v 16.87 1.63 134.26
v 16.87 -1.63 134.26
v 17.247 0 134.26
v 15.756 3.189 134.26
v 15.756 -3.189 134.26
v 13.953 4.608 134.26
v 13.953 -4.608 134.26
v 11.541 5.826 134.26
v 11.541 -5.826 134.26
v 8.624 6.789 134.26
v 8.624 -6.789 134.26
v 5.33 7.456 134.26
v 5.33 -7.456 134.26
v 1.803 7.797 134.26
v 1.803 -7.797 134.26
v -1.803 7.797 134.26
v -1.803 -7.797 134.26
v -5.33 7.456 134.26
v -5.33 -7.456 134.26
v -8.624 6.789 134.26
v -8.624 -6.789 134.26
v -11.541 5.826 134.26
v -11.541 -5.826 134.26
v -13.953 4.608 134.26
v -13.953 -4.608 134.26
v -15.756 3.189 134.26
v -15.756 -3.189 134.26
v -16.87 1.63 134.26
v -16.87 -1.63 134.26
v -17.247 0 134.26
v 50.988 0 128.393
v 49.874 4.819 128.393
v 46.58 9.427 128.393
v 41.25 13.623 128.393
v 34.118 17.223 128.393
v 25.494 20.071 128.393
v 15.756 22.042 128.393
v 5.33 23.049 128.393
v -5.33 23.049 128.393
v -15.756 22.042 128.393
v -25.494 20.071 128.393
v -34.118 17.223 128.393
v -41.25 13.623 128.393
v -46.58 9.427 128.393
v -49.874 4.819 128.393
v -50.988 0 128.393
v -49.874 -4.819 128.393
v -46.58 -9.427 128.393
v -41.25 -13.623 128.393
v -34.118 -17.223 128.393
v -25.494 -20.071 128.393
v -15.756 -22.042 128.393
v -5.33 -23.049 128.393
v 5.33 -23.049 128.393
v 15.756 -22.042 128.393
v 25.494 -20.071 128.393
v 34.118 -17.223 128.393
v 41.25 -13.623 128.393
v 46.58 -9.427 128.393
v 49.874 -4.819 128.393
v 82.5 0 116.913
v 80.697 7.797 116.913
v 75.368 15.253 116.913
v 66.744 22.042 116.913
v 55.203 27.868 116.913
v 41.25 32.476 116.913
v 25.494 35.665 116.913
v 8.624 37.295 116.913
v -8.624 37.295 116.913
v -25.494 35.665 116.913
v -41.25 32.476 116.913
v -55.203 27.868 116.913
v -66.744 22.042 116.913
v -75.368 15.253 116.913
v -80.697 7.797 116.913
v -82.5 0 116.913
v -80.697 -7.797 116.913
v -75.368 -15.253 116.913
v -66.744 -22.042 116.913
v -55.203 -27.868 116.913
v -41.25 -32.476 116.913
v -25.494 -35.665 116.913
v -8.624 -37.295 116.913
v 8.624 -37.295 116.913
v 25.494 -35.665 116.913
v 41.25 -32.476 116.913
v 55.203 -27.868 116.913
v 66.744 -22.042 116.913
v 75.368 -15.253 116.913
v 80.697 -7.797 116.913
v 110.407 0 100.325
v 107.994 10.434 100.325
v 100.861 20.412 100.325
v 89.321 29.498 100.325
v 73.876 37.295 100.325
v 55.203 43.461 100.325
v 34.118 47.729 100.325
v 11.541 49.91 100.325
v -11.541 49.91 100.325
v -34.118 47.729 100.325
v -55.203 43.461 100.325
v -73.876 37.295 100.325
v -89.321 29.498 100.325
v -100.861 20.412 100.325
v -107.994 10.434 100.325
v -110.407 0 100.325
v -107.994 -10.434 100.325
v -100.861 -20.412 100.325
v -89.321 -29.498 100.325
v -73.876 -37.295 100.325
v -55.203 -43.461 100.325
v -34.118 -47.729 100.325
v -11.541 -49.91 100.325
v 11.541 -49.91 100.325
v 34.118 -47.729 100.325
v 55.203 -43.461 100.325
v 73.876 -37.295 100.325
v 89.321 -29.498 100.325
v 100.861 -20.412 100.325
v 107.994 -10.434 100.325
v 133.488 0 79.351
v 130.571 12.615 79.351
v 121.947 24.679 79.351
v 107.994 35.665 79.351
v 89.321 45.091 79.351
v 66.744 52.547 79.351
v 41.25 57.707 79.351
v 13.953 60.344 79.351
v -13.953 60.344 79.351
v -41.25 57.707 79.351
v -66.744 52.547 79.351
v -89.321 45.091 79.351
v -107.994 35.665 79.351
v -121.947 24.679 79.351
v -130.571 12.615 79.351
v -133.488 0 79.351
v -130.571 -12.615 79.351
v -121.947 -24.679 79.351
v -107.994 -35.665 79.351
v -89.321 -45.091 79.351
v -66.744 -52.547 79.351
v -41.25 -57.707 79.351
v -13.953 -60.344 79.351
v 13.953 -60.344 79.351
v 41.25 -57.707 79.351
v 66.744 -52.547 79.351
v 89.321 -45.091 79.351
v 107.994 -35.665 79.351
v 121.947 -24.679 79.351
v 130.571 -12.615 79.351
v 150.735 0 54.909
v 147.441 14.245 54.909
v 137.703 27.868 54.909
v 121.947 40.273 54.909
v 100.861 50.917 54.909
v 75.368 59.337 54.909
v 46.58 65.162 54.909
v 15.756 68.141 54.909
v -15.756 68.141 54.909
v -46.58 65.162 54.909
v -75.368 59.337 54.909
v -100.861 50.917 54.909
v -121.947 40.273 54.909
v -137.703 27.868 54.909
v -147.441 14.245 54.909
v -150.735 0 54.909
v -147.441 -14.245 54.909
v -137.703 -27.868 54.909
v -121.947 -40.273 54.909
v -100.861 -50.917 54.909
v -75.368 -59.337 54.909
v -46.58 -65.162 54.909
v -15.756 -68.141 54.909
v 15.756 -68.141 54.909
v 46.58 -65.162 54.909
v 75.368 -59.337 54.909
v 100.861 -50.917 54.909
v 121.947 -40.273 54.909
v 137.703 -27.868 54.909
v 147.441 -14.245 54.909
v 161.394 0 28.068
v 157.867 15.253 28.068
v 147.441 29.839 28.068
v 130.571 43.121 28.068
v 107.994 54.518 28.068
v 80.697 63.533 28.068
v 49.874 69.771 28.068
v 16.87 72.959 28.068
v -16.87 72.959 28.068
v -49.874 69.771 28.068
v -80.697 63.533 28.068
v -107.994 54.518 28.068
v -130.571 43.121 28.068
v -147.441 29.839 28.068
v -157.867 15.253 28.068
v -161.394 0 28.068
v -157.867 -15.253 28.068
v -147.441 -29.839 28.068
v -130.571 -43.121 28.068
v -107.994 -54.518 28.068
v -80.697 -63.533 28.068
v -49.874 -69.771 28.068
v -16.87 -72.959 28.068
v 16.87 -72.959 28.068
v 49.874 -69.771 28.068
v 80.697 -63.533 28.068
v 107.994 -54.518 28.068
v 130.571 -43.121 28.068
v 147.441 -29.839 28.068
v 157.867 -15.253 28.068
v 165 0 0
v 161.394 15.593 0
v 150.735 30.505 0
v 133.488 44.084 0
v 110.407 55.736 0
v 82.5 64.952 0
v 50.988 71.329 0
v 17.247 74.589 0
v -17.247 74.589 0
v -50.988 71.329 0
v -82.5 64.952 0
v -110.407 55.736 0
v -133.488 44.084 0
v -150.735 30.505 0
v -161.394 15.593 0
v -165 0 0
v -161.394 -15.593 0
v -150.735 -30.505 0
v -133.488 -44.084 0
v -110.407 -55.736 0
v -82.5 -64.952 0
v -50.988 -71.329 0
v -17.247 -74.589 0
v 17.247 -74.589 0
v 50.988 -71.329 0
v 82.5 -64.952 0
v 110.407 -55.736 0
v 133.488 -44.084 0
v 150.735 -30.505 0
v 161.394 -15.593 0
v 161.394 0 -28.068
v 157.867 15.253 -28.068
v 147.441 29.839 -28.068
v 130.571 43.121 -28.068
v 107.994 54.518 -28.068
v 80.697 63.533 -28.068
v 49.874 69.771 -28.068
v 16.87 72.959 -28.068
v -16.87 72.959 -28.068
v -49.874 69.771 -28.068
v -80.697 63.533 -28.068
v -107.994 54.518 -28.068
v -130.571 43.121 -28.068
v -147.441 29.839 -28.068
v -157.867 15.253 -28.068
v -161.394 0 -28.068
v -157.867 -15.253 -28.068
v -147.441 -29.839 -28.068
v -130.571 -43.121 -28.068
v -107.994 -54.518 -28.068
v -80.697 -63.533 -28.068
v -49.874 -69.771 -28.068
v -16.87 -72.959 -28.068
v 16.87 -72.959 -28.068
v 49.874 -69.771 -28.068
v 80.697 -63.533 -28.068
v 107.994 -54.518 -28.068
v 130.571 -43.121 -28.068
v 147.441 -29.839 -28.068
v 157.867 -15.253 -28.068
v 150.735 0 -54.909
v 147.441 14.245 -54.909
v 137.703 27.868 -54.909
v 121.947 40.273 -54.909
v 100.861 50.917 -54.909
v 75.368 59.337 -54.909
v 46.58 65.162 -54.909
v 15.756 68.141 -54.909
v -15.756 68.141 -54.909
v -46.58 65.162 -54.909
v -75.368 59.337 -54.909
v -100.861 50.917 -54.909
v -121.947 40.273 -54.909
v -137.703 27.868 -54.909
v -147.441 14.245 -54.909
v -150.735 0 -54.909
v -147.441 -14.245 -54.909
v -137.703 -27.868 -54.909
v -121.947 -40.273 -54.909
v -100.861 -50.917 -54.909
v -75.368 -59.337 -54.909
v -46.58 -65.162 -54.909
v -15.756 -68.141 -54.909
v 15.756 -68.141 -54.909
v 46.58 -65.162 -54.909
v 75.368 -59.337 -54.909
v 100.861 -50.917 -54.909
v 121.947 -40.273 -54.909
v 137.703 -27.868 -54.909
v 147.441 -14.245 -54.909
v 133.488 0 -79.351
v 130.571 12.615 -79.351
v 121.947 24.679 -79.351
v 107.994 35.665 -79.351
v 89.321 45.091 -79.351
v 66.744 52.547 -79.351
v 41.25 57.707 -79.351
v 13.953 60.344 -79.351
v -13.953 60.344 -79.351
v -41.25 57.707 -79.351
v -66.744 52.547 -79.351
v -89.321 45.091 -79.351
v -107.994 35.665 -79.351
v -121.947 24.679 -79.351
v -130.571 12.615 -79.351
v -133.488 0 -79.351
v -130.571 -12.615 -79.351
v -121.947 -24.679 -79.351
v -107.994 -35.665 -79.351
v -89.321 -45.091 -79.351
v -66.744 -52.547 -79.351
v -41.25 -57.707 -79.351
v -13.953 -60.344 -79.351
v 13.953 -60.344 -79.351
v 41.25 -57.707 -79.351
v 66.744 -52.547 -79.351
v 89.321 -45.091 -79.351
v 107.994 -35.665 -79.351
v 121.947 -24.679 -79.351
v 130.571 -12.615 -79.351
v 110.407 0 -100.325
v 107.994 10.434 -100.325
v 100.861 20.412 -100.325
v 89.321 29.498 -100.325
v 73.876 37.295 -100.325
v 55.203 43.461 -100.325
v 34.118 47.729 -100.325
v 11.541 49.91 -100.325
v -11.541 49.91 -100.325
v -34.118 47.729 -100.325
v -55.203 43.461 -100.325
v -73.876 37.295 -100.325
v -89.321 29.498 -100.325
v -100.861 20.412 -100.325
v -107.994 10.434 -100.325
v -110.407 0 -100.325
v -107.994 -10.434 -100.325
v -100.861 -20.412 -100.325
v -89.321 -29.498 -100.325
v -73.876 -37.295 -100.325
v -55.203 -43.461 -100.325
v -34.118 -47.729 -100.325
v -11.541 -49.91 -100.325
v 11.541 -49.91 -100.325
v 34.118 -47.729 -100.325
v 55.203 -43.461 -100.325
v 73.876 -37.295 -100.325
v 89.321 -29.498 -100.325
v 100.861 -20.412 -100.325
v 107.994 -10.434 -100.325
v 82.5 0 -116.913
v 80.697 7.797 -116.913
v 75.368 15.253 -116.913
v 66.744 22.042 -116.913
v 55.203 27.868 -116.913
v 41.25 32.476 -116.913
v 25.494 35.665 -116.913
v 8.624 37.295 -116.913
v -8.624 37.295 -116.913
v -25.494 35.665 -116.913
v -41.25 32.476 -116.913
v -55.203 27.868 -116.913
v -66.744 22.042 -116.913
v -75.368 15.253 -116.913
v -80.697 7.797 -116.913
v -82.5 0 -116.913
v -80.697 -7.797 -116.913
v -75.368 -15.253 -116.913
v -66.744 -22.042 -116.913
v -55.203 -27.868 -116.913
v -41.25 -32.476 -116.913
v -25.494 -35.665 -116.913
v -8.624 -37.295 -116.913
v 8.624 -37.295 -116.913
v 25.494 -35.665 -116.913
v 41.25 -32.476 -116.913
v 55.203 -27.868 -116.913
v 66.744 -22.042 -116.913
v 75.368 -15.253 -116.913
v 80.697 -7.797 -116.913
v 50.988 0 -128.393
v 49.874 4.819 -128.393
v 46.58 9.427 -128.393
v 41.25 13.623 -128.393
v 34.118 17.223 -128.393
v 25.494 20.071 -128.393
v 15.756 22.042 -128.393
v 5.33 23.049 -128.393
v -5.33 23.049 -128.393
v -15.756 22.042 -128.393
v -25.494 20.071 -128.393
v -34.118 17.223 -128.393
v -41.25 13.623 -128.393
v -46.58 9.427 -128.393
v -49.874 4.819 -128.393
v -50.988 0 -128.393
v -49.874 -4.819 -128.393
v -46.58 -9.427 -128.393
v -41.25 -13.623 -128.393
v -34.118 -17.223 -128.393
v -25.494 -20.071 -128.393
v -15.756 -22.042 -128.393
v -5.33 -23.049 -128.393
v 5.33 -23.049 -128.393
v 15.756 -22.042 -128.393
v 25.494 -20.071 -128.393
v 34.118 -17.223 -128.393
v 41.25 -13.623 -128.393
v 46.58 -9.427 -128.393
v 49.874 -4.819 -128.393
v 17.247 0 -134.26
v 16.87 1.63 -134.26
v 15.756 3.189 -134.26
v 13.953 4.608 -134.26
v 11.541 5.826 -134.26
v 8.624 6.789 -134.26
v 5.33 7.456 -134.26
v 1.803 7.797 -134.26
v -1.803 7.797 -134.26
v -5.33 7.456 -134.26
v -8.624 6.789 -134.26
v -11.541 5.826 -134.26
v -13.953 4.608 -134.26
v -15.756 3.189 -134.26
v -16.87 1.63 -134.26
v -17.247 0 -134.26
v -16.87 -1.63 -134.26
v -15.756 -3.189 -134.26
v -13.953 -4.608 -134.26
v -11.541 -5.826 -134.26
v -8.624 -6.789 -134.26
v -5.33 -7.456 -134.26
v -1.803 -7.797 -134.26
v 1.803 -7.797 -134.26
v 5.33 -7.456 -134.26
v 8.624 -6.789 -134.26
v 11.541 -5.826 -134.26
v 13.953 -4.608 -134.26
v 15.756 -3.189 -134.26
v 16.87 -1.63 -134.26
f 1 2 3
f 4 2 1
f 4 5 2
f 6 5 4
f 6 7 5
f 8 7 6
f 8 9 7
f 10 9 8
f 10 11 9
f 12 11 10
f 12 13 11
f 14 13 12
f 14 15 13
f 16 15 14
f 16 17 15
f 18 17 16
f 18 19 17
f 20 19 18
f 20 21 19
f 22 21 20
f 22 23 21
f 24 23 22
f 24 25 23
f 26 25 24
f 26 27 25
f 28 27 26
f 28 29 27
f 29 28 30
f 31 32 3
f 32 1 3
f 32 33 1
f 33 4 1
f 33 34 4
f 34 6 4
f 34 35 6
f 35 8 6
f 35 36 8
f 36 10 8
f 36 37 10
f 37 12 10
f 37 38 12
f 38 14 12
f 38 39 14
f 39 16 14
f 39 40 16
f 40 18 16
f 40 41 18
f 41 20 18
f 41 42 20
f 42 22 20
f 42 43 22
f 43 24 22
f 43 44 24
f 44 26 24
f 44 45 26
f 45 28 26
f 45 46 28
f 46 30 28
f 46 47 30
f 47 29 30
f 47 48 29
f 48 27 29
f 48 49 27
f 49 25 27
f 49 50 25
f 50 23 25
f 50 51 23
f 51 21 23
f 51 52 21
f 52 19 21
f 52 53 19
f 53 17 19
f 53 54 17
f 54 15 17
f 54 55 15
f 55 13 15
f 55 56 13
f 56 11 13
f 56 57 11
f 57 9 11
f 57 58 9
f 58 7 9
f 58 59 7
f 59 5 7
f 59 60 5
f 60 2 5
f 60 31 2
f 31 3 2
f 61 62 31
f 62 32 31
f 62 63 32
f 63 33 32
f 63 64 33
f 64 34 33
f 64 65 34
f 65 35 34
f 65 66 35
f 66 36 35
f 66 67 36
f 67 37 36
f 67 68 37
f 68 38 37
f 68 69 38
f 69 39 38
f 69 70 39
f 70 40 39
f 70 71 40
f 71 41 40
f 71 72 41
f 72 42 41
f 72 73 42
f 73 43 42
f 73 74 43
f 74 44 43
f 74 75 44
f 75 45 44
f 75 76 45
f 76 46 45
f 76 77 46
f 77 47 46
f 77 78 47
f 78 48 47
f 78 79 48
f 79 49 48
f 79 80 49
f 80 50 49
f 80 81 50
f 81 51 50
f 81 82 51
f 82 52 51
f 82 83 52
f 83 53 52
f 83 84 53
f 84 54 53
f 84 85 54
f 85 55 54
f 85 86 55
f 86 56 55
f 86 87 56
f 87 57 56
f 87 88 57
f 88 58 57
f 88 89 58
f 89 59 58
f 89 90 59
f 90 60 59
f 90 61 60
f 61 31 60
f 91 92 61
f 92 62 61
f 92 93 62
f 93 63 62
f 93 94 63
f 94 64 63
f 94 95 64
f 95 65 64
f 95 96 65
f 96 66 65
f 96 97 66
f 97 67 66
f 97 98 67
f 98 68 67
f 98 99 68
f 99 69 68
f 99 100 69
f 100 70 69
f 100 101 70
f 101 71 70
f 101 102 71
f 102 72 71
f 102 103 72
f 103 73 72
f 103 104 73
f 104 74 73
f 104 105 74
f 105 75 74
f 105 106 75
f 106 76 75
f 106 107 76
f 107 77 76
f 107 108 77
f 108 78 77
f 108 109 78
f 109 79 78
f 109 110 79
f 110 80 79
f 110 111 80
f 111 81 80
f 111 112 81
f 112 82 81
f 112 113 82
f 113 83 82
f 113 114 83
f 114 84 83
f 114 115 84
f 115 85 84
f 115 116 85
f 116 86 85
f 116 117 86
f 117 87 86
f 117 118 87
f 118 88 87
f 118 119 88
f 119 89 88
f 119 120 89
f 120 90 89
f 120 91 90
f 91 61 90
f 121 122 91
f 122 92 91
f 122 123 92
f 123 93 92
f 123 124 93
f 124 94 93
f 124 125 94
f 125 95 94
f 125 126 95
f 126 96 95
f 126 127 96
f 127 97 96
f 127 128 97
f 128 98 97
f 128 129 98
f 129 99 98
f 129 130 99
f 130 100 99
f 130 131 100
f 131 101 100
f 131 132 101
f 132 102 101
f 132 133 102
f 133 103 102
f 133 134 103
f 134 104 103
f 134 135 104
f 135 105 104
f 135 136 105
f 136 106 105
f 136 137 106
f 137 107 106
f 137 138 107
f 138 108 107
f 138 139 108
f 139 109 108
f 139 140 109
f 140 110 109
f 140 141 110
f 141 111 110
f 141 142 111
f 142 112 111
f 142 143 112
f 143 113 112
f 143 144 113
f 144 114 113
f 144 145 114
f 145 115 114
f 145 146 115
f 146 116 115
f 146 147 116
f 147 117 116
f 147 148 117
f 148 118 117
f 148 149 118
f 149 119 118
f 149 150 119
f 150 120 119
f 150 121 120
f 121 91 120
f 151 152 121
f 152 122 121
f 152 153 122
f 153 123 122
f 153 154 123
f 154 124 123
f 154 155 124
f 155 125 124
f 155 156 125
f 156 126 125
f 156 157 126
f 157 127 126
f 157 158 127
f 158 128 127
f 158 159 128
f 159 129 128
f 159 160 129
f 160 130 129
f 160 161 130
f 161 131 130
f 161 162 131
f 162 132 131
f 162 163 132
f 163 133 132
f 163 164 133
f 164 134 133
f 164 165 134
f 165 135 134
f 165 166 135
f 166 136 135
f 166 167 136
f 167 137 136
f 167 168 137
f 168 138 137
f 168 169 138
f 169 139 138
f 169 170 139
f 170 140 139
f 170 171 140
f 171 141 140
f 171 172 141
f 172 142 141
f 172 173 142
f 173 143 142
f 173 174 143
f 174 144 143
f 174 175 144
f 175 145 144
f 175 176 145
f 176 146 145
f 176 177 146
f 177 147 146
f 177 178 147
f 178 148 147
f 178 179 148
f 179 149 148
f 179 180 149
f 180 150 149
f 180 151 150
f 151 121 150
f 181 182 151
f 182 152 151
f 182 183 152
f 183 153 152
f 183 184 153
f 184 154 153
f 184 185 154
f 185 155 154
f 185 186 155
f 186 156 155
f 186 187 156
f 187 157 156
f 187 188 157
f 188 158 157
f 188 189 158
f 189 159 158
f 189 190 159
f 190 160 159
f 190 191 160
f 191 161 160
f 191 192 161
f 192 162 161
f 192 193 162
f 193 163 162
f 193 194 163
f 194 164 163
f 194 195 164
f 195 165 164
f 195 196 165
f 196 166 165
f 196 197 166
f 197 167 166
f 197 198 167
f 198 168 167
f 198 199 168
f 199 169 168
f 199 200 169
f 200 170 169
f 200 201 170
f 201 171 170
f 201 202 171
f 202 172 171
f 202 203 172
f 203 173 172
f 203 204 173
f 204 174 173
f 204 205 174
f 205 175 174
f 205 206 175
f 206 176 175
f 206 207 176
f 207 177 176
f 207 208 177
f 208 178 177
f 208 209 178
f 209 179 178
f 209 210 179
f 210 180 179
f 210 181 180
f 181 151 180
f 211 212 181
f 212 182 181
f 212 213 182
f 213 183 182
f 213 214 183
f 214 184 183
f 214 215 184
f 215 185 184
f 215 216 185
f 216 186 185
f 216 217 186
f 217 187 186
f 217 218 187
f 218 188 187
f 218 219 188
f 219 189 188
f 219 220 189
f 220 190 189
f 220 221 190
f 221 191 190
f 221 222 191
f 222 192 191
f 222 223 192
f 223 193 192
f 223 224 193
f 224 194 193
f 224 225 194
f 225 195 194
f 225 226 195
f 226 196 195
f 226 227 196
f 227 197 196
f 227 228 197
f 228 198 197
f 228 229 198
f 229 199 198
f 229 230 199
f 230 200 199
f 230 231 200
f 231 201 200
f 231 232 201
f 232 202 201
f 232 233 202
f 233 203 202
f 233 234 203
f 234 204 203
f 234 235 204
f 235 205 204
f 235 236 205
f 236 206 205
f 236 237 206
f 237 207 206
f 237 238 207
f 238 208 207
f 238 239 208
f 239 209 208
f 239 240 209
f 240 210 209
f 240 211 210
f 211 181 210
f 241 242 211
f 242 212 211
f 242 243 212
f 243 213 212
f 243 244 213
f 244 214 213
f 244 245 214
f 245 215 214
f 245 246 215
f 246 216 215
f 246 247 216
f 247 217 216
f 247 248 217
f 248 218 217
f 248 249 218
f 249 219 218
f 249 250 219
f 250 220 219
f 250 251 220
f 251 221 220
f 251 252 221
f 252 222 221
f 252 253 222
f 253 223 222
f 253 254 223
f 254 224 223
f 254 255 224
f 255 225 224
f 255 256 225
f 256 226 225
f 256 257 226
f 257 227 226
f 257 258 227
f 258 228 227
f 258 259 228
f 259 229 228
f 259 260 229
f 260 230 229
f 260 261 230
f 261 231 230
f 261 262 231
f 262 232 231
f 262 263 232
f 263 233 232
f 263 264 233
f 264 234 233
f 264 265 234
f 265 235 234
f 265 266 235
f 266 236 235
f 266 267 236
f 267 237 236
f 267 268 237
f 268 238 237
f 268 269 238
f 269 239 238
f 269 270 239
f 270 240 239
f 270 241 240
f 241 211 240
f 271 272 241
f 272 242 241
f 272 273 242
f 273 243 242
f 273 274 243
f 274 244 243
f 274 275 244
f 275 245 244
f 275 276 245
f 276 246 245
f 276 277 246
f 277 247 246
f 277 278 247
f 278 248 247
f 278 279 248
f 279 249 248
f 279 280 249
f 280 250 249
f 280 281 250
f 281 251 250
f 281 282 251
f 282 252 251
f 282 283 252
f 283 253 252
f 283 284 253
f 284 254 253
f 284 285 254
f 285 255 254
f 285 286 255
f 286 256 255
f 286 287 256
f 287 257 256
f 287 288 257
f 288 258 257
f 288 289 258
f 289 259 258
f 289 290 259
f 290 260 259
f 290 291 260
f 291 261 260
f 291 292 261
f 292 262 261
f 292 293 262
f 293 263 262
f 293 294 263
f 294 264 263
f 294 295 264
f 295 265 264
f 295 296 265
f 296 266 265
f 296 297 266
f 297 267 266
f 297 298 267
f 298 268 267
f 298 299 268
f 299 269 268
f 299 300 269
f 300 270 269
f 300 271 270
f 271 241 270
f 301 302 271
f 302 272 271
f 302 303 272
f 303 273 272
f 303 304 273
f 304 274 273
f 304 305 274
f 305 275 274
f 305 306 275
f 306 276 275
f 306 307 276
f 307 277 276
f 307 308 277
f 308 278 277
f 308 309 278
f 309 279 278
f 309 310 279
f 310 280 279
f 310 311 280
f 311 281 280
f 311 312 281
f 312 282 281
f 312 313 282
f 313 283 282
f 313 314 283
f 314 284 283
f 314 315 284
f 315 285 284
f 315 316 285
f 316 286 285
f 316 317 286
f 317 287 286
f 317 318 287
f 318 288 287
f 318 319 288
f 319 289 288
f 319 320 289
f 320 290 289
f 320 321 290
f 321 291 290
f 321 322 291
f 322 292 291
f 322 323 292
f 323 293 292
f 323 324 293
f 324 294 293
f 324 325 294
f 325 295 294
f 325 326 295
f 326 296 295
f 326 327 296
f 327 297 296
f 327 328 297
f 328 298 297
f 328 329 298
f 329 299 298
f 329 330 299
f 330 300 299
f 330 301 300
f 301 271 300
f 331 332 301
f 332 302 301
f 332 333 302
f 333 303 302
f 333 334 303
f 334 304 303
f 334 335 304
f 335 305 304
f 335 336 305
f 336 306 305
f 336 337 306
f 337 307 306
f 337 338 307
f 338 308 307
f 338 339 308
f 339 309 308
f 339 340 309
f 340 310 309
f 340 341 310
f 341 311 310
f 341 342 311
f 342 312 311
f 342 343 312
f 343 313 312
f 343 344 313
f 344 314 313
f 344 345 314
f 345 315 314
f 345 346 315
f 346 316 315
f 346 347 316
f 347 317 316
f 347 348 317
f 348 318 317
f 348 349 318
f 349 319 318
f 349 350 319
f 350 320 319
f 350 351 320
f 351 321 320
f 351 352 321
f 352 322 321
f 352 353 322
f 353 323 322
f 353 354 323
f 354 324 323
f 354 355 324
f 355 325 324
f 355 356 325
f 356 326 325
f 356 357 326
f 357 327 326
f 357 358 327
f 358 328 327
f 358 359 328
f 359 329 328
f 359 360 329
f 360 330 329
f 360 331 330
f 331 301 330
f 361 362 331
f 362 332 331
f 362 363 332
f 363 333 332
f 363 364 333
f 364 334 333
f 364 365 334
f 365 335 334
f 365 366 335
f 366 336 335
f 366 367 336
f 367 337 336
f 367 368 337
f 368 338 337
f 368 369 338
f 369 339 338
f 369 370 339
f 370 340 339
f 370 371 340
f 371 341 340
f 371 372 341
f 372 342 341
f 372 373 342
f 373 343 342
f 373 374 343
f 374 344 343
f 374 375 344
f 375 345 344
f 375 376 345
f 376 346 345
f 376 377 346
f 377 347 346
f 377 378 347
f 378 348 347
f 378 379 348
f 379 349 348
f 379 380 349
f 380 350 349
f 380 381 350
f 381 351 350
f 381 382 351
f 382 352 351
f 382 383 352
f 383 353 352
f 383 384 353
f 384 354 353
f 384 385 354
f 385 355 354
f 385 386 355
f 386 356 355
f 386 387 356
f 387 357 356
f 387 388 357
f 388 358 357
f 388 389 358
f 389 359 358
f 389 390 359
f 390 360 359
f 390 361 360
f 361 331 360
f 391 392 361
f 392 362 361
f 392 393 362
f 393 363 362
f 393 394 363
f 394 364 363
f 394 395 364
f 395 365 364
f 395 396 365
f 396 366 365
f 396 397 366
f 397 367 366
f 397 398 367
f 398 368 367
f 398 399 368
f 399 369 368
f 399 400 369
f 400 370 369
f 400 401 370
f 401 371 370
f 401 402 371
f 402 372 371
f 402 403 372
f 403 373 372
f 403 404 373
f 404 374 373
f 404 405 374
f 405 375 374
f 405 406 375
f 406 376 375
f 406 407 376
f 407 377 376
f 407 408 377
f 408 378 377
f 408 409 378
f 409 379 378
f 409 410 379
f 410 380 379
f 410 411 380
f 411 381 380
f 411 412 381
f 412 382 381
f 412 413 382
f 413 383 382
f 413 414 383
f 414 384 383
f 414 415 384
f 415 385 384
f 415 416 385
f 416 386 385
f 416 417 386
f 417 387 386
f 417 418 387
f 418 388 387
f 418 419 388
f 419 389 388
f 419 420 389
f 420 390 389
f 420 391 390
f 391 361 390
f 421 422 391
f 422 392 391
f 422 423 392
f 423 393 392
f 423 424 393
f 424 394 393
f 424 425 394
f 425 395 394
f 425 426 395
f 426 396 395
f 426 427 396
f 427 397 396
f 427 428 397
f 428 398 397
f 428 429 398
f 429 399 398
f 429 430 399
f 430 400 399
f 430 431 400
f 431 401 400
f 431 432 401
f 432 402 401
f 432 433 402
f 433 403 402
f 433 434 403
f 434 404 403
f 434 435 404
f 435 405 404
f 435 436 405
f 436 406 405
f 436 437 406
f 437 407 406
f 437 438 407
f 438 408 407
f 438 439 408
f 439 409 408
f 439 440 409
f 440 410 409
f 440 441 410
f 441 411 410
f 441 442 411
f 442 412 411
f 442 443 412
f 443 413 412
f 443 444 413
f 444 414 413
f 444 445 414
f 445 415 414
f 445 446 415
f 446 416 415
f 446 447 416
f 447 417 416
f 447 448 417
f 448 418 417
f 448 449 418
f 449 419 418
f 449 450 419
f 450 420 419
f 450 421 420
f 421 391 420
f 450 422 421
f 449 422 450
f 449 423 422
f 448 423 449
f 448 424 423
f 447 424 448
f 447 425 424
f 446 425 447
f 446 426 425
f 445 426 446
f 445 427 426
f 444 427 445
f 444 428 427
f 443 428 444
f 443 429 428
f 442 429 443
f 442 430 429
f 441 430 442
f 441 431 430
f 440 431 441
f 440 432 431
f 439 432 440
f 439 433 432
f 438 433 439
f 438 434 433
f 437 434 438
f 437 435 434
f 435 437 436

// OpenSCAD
// Generated by SolidPython 1.0.1 on 2020-07-29 00:46:49


scale(v = [11, 5, 9]) {
	sphere(r = 15);
}
/***********************************************
*********      SolidPython code:      **********
************************************************
 
# import packages: SolidPython
from solid import *
from solid.utils import *
from itertools import chain, combinations, permutations


class Resize:

    def __init__(self, scad_file):
        self.scad_file = scad_file
        #self.scad_file = import_scad(scad_file)
        # cone/cylinder param:
        self.r1 = 0
        self.r2 = 0
        self.h = 0
        # rectangular prism param:
        self.w = 0
        self.l = 0
        # ellipse param:
        self.r = 0

    # import OpenScad code (file name corresponds to shape)


    # classify shape + parameters
    def assign(self, param1, param2, param3):
        if self.scad_file == 'cone.scad':
            self.r1 = param1
            self.r2 = param2
            self.h = param3
        elif self.scad_file == 'cylinder.scad':
            self.r1 = param1
            self.r2 = param2
            self.h = param3
        elif self.scad_file == 'rectangularPrism.scad':
            self.h = param1
            self.l = param2
            self.w = param3
        else:
            self.r = param1
            self.h = param2

    # resize parameters
    def iterate(self):
        x = range(3, 20, 2)
        i = 1
        if self.scad_file == 'cone.scad':
            tempList = list(permutations(x, 2))
            for temp in tempList:
                param1 = temp[0]
                param2 = temp[1]
                filepath = 'produced_scad_files/' + 'cone' + str(param1) + '_' + str(param2) + '_' + '.scad'
                scad_render_to_file(cylinder(h=param1, r1=param2, r2=0), filepath)

        elif self.scad_file == 'cylinder.scad':
            tempList = list(permutations(x, 3))
            for temp in tempList:
                param1 = temp[0]
                param2 = temp[1]
                filepath = 'produced_scad_files/' + 'cylinder' + str(param1) + '_' + str(param2) + '_' + '.scad'
                scad_render_to_file(cylinder(h=param1, r1=param2, r2=param2), filepath)

        elif self.scad_file == 'rectangularPrism.scad':
            tempList = list(permutations(x, 3))
            for temp in tempList:
                param1 = temp[0]
                param2 = temp[1]
                param3 = temp[2]
                filepath = 'produced_scad_files/' + 'rectangularPrism' + str(param1) + '_' + str(param2) + '_' + str(
                    param3) + '.scad'
                scad_render_to_file(cube(size=(param1, param2, param3)), filepath)

        elif self.scad_file == 'ellipse.scad':
            tempList = list(permutations(x, 4))
            for temp in tempList:
                param1 = temp[0]
                param2 = temp[1]
                param3 = temp[2]
                param4 = temp[3]
                filepath = 'produced_scad_files/' + 'ellipse' + str(param1) + '_' + str(param2) + '_' + str(param3) + '_' + str(param4) + '.scad'
                scad_render_to_file(scale([param1, param2, param3])(sphere(r=param4)), filepath)

    def render_to_scadfile(self):
        scad_render_to_file(scad, 'example.scad') 
 
************************************************/
